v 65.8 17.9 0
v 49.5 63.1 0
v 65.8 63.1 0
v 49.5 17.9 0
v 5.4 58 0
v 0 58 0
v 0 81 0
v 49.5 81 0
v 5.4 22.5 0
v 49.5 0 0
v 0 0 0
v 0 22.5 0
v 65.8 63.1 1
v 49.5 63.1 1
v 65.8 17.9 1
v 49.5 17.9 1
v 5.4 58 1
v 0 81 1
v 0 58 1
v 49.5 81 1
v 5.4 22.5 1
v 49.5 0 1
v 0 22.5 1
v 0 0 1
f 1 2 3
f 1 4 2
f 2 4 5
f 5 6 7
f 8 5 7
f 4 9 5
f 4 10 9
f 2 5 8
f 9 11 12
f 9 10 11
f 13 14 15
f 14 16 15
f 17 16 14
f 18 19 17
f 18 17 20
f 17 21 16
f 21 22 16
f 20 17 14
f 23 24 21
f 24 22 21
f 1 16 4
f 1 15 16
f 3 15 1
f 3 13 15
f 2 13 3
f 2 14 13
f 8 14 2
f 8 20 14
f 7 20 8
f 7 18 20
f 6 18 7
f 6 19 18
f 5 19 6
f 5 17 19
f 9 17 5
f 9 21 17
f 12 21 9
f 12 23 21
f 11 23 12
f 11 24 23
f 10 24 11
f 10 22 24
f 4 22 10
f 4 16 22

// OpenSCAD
//linear_extrude(90)

thickness = 1;

module base() {
  polygon([
    [0.00, 0.00],
    [49.5, 0.00],
    [49.5, 17.9],
    [65.8, 17.9],
    [65.8, 63.1],
    [49.5, 63.1],
    [49.5, 81.0],
    [0.00, 81.0],
    [0.00, 58.0],
    // lug start
    [2.00, 58.0],
    [2.00, 56.0],
    [3.00, 56.0],
    [4.40, 58.0],
    // lug end
    [5.40, 58.0],
    [5.40, 22.5],
    [0.00, 22.5]
  ]);
}

module base2() {
  polygon([
    [0.00, 0.00],
    [49.5, 0.00],
    [49.5, 17.9],
    [65.8, 17.9],
    [65.8, 63.1],
    [49.5, 63.1],
    [49.5, 81.0],
    [0.00, 81.0],
    [0.00, 58.0],

    [5.40, 58.0],
    [5.40, 22.5],
    [0.00, 22.5]
  ]);
}



linear_extrude(1) base2();
